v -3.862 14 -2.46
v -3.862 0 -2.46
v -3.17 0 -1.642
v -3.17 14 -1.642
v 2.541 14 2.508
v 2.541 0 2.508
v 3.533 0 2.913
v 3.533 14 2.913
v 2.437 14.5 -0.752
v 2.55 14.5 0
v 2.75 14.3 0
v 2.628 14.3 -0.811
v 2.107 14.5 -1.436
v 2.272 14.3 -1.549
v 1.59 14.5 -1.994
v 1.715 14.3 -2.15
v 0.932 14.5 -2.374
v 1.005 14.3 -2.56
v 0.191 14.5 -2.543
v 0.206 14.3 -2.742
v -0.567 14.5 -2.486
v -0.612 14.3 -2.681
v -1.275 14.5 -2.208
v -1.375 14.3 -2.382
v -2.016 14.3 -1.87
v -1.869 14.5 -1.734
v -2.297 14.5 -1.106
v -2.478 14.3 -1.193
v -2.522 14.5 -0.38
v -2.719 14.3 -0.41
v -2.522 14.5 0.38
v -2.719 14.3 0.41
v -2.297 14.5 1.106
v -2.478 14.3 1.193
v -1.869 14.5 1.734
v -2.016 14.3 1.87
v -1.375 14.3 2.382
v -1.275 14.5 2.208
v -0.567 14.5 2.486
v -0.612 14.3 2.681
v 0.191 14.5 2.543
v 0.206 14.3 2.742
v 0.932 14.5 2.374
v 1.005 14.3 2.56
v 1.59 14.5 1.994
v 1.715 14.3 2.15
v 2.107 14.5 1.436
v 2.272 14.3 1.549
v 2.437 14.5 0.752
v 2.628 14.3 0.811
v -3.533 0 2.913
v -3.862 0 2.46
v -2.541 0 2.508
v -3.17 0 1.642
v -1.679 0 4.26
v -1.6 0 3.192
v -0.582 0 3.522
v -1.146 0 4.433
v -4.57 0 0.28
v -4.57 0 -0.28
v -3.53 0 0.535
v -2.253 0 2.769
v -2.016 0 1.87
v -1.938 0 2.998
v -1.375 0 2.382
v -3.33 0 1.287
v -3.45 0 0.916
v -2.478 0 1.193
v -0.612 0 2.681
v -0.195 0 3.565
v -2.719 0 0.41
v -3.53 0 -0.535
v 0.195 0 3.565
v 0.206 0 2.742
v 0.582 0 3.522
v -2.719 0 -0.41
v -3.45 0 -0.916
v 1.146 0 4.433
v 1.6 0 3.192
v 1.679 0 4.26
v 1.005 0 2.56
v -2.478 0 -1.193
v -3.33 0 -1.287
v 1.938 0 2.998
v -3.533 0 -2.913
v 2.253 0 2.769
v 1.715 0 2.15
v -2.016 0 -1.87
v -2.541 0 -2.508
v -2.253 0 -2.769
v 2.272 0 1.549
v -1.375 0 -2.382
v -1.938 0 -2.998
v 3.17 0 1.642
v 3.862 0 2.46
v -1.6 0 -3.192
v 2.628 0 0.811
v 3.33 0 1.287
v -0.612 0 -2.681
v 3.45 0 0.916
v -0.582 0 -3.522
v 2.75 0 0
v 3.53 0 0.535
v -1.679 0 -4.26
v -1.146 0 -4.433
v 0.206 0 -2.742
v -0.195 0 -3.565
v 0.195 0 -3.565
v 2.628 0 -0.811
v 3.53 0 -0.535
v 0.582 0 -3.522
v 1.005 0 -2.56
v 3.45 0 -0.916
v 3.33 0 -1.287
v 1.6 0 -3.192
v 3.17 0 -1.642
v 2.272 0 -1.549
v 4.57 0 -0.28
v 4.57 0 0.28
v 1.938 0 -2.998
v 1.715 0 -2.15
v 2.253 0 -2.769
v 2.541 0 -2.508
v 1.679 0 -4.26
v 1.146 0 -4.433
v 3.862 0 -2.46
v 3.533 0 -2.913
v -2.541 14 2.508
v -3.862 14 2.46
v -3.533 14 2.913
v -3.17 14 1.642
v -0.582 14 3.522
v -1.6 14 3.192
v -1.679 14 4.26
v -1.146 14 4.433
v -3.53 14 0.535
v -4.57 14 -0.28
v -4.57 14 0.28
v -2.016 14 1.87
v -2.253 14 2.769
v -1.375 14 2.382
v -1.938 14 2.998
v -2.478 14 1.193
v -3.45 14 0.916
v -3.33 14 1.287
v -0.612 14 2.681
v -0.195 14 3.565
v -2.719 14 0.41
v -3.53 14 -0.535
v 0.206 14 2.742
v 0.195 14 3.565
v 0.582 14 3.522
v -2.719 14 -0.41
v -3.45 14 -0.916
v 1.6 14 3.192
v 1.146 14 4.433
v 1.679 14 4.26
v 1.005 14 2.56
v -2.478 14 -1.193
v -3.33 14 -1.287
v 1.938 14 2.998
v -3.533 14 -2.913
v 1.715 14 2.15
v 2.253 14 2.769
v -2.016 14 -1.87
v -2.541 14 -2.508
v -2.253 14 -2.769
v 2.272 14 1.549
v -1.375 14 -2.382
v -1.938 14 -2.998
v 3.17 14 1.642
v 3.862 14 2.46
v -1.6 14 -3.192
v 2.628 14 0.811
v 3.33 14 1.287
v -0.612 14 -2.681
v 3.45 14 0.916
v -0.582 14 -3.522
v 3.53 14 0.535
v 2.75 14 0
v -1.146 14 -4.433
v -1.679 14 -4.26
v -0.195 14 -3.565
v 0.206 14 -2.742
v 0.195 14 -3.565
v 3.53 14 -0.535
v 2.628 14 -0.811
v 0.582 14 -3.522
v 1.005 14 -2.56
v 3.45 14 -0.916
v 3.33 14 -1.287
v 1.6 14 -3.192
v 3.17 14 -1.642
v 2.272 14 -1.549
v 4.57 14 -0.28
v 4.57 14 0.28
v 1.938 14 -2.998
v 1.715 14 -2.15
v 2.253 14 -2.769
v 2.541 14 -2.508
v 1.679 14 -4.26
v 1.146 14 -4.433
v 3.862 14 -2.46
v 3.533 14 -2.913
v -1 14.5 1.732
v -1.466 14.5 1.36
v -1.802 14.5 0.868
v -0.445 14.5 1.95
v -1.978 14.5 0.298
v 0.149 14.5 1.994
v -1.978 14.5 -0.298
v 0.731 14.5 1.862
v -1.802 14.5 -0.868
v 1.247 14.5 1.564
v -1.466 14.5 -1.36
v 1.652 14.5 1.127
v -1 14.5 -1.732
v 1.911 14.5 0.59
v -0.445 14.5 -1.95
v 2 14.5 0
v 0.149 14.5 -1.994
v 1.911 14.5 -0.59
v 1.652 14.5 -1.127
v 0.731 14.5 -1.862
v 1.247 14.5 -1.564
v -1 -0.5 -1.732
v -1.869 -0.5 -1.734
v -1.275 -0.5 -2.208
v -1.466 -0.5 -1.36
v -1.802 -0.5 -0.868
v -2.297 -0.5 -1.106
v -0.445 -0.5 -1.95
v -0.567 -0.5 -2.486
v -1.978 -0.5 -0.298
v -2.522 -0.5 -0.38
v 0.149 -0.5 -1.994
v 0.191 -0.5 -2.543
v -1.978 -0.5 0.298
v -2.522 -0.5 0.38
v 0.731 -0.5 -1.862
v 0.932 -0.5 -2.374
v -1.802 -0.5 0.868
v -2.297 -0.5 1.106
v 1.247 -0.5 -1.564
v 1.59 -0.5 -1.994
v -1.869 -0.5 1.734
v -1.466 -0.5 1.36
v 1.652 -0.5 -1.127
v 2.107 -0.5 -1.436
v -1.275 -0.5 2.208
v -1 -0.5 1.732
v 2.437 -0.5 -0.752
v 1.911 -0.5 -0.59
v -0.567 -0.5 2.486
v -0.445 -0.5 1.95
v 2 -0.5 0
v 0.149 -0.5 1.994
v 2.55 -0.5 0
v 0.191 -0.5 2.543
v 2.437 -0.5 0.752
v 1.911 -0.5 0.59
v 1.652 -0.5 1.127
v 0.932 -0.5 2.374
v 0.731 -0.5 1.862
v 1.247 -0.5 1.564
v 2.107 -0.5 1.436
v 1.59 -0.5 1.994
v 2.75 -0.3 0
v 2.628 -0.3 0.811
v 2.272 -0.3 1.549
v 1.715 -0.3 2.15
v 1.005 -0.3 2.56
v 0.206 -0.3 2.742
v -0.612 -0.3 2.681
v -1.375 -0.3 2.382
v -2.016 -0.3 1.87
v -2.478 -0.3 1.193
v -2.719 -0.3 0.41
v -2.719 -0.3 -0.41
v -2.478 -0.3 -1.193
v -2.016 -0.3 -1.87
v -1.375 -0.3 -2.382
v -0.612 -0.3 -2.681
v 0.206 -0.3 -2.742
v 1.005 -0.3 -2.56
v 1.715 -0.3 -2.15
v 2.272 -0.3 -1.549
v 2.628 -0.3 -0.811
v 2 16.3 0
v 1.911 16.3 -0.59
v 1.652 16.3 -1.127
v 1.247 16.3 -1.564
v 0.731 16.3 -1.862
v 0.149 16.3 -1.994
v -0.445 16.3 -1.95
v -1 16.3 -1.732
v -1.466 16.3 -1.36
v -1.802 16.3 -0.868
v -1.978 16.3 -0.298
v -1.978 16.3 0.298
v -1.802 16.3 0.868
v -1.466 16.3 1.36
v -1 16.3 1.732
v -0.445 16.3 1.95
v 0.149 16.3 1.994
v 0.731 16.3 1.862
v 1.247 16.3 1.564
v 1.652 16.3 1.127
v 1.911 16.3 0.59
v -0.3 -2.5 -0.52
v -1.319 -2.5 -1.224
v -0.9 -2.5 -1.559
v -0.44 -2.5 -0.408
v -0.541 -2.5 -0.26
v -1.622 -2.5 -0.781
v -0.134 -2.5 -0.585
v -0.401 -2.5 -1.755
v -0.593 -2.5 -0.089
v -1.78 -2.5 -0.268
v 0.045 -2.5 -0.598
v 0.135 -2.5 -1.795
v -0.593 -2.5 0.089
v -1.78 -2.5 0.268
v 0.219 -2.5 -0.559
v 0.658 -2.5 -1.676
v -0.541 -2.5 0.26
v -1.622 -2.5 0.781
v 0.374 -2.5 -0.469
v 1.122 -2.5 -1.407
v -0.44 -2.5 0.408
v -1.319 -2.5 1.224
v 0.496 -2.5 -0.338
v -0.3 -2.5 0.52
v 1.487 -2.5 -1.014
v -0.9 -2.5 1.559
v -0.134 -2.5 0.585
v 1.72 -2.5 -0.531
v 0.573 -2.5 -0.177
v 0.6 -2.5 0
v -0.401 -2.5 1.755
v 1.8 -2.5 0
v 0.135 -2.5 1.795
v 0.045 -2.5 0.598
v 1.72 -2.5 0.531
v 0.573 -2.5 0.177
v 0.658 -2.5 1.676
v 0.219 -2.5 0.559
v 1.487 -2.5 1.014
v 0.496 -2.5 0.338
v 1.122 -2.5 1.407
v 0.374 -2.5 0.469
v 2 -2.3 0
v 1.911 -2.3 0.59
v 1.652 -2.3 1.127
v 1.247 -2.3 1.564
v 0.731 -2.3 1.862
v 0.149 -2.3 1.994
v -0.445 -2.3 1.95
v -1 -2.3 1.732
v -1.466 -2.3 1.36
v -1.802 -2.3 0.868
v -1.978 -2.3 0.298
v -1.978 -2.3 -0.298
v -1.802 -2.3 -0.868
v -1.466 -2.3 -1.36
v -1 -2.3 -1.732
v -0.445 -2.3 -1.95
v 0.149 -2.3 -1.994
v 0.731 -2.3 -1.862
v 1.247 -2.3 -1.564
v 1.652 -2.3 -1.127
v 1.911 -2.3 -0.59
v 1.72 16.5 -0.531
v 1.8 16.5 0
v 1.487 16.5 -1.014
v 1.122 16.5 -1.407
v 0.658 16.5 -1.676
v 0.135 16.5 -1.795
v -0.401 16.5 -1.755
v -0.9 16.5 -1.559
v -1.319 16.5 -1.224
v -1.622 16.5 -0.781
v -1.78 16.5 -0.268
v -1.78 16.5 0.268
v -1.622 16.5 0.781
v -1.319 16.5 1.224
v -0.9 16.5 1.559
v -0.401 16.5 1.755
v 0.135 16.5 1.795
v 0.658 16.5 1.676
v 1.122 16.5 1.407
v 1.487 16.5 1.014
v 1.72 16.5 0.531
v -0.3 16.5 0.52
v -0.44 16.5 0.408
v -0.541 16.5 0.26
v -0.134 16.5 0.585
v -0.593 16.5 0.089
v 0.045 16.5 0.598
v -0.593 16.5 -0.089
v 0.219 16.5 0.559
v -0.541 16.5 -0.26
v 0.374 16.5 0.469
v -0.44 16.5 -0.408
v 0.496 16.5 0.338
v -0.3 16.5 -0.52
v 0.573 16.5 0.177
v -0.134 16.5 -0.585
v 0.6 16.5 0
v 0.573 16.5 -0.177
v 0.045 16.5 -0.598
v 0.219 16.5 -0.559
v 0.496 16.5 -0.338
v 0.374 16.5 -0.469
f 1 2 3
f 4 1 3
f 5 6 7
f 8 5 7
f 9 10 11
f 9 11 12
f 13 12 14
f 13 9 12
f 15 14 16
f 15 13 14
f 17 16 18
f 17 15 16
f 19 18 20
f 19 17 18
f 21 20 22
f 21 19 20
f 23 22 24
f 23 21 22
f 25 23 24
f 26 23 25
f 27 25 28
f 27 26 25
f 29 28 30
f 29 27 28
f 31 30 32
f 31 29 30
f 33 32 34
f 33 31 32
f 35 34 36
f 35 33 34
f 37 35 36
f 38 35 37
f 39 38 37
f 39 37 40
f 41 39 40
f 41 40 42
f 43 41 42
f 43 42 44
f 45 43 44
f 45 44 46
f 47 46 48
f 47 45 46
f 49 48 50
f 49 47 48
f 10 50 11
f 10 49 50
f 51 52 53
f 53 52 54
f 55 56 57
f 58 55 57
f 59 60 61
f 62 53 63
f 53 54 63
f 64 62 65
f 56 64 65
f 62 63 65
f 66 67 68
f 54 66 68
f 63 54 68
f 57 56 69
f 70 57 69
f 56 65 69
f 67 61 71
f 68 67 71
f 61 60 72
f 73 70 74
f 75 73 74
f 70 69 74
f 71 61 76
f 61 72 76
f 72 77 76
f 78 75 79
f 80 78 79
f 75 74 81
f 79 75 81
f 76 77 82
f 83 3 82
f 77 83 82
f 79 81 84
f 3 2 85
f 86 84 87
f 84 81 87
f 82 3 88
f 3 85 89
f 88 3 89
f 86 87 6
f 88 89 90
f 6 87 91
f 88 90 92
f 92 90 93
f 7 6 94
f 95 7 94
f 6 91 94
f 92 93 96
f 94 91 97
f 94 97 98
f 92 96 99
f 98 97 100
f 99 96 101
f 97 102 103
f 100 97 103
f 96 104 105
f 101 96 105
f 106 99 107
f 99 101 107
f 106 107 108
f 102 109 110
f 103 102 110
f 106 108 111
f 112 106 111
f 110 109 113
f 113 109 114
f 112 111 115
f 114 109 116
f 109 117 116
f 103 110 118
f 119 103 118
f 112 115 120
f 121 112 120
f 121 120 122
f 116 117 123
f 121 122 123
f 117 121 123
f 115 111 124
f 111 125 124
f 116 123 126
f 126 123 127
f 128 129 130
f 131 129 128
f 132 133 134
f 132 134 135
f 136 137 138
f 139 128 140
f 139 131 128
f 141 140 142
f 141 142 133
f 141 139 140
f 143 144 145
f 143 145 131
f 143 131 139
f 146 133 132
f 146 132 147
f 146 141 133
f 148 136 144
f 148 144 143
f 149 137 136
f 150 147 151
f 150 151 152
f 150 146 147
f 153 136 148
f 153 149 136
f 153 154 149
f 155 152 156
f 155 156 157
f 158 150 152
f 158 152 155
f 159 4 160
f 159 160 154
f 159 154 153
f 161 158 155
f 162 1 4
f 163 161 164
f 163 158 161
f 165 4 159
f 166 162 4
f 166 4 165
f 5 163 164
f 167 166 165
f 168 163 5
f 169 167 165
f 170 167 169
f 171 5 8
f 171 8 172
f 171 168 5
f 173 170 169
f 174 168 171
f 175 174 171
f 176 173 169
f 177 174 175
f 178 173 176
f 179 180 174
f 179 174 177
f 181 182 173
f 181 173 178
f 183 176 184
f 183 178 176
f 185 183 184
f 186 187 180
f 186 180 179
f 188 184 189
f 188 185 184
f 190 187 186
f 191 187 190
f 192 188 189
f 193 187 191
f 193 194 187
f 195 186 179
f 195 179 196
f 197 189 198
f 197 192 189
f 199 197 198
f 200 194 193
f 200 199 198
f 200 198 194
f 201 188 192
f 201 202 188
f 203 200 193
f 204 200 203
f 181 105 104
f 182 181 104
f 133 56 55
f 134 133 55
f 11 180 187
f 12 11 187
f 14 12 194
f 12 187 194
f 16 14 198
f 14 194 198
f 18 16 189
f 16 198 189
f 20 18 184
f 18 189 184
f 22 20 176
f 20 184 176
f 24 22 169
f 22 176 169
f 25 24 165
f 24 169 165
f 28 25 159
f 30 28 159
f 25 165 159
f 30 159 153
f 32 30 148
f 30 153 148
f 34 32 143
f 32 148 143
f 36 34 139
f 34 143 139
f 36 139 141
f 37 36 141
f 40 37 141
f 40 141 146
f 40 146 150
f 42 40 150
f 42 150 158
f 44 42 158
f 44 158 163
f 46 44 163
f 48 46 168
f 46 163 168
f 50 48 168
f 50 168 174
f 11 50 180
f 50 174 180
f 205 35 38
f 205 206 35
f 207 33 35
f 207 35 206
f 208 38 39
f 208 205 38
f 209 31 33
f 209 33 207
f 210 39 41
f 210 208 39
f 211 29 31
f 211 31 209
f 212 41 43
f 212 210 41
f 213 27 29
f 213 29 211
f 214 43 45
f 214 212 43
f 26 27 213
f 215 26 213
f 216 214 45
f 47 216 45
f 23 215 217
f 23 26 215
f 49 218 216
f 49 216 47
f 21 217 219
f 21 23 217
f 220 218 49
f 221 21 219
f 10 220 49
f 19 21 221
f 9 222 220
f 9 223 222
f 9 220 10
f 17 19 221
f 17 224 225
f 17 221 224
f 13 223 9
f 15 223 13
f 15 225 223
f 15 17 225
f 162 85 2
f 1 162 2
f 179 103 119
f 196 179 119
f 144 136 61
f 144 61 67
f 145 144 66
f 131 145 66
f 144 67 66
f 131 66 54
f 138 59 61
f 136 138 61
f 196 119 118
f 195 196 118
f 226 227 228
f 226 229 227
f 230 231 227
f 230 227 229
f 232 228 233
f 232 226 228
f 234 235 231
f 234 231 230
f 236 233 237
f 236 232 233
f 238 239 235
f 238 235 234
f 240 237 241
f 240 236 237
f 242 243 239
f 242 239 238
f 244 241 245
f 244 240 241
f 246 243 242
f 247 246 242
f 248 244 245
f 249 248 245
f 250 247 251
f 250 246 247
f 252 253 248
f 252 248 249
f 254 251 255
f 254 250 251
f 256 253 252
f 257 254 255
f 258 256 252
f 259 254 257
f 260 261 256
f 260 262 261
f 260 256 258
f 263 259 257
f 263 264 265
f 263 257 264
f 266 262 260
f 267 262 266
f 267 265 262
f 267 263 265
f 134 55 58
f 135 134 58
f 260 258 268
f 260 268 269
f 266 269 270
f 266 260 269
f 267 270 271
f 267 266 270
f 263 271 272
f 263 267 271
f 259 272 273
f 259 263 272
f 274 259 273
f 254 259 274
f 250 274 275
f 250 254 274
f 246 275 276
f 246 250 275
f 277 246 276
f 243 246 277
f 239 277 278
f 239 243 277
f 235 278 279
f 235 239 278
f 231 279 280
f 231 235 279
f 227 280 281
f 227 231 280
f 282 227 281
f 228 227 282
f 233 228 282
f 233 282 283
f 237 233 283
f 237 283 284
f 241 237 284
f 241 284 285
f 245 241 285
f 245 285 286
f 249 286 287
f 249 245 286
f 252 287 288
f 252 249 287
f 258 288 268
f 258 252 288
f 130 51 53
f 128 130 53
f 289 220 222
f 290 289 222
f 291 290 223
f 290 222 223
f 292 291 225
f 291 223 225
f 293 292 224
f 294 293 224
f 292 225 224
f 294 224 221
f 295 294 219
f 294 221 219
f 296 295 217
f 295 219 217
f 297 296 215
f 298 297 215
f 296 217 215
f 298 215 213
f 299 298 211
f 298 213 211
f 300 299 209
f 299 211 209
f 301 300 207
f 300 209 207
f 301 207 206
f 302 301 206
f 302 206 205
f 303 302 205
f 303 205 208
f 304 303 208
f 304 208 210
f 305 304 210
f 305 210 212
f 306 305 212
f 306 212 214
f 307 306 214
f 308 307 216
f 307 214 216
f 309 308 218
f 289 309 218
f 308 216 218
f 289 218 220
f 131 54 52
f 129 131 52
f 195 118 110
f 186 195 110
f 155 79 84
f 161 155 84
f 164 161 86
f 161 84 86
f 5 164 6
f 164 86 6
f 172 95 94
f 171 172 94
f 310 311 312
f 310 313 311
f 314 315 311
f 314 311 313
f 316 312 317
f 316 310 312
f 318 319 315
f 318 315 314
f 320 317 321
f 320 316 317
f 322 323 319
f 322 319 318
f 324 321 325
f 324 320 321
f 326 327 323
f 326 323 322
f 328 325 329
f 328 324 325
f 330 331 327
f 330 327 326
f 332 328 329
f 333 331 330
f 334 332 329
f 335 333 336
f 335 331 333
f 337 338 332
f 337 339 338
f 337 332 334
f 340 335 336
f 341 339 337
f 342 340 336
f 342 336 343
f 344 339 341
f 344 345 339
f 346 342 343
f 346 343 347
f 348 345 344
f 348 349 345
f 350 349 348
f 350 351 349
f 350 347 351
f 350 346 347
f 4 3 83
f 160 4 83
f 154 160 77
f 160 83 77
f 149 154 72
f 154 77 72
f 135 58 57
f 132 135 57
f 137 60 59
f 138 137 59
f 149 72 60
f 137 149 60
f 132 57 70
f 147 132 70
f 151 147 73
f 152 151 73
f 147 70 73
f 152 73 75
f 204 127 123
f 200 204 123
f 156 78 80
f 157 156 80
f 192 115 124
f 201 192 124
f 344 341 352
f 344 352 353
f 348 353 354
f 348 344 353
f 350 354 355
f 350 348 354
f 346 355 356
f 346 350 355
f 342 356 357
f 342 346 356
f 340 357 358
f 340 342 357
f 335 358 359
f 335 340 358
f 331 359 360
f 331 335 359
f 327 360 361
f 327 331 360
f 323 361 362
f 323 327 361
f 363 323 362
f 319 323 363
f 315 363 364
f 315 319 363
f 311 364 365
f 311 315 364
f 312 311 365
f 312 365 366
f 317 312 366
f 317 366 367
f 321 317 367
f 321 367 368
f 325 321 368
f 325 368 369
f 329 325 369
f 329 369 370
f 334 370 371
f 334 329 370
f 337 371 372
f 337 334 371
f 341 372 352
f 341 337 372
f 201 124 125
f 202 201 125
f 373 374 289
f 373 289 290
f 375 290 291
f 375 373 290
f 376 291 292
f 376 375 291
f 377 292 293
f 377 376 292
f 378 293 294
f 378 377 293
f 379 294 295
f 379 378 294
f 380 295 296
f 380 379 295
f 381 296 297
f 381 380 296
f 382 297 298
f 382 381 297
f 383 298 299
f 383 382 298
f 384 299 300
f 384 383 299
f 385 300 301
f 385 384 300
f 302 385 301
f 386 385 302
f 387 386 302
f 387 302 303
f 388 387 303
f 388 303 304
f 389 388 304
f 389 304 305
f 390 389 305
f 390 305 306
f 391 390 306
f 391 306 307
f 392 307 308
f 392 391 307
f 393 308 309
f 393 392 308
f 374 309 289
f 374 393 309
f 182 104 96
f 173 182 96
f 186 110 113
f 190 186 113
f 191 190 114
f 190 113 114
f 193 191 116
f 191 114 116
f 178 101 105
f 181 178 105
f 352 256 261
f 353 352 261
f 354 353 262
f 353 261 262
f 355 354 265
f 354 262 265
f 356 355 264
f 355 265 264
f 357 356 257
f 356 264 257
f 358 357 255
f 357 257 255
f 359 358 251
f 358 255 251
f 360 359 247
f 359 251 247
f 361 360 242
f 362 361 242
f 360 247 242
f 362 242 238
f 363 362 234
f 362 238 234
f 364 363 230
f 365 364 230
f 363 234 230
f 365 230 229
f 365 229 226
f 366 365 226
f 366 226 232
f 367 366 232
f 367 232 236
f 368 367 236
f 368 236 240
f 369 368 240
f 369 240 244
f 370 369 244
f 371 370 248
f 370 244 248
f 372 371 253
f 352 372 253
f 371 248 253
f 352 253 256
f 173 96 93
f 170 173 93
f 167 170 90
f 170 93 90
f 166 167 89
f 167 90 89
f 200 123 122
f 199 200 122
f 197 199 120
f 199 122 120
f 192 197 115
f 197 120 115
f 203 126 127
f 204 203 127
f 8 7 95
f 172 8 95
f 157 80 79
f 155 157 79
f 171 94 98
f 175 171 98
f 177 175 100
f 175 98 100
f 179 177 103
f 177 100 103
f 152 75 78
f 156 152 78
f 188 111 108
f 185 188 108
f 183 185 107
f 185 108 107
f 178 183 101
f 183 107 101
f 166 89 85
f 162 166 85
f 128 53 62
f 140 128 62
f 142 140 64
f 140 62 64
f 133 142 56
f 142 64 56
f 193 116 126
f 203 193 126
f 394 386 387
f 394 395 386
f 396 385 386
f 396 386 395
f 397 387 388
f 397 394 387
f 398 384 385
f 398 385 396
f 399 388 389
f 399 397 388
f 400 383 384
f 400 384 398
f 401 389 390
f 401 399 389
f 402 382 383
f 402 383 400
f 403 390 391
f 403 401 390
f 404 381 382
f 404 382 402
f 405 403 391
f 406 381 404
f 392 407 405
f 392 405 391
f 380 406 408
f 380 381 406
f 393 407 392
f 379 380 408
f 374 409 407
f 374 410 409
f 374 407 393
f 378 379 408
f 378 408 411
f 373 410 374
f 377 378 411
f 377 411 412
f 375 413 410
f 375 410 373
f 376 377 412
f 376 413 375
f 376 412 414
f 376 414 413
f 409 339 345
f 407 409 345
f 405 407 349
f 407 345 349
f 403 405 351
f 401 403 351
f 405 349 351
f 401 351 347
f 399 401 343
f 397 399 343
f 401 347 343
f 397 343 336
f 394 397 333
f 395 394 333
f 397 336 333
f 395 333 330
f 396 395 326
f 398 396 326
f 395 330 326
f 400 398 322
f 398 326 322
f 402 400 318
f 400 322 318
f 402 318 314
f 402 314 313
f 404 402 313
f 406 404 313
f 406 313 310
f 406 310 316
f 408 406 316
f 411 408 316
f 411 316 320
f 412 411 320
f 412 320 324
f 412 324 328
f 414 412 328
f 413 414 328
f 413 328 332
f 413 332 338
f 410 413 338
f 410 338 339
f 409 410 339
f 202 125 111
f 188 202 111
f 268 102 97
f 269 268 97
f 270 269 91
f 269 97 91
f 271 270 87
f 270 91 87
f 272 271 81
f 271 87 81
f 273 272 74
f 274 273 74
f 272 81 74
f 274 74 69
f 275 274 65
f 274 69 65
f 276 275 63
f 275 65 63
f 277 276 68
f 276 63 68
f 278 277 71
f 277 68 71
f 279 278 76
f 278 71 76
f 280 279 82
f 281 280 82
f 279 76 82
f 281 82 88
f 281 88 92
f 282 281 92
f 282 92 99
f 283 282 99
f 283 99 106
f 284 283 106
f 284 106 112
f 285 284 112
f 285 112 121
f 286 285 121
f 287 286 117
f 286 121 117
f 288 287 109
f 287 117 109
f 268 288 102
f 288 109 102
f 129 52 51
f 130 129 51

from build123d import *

# Parameters (mm, degrees)
BOSS_EXTRUDE3_DEPTH = 14
CIRPATTERN2_COUNT   = 10
SKETCH3_R           = 2.75
BOSS_EXTRUDE4_DEPTH = 0.5
SKETCH4_R           = 2.75
BOSS_EXTRUDE5_DEPTH = 0.5
SKETCH5_R           = 2
BOSS_EXTRUDE6_DEPTH = 2
SKETCH6_R           = 2
BOSS_EXTRUDE7_DEPTH = 2
CHAMFER1_SIZE       = 0.2
SKETCH7_R           = 0.6
CUT_EXTRUDE1_DEPTH  = 20


with BuildPart() as part:
    # Sketch1 → Boss-Extrude3 (new body)
    with BuildSketch(Plane(origin=(0, 0, 0), x_dir=(1, 0, 0), z_dir=(0, 1, 0))):
        with BuildLine():
            ThreePointArc((3.529675716, 0.535060126), (-3.57, 0), (3.529675716, -0.535060126))
            Line((3.529675716, -0.535060126), (3.265358075, -0.599863853))
            ThreePointArc((3.265358075, -0.599863853), (3.32, 0), (3.265358075, 0.599863853))
            Line((3.265358075, 0.599863853), (3.529675716, 0.535060126))
        make_face()
        with BuildLine():
            Line((3.265358075, -0.599863853), (3.529675716, -0.535060126))
            ThreePointArc((3.529675716, -0.535060126), (3.559904655, -0.268288737), (3.57, 0))
            ThreePointArc((3.57, 0), (3.559904655, 0.268288737), (3.529675716, 0.535060126))
            Line((3.529675716, 0.535060126), (3.265358075, 0.599863853))
            ThreePointArc((3.265358075, 0.599863853), (3.32, 0), (3.265358075, -0.599863853))
        make_face()
        with BuildLine():
            Line((4.57, -0.28), (4.57, 0))
            Line((4.57, 0), (4.57, 0.28))
            Line((4.57, 0.28), (3.529675716, 0.535060126))
            ThreePointArc((3.529675716, 0.535060126), (3.559904655, 0.268288737), (3.57, 0))
            ThreePointArc((3.57, 0), (3.559904655, -0.268288737), (3.529675716, -0.535060126))
            Line((3.529675716, -0.535060126), (4.57, -0.28))
        make_face()
    boss_extrude3 = extrude(amount=BOSS_EXTRUDE3_DEPTH)

    # CirPattern2: Boss-Extrude3 ×10 about axis
    cirpattern2_axis = Axis((0, 0, 0), (0, 1, 0))
    for i in range(1, CIRPATTERN2_COUNT):
        add(boss_extrude3.rotate(cirpattern2_axis, i * 360 / CIRPATTERN2_COUNT))

    # Sketch3 → Boss-Extrude4 (add)
    with BuildSketch(Plane(origin=(0, 14, 0), x_dir=(1, 0, 0), z_dir=(0, 1, 0))):
        Circle(SKETCH3_R)
    extrude(amount=BOSS_EXTRUDE4_DEPTH)

    # Sketch4 → Boss-Extrude5 (add)
    with BuildSketch(Plane.XZ):
        Circle(SKETCH4_R)
    extrude(amount=BOSS_EXTRUDE5_DEPTH)

    # Sketch5 → Boss-Extrude6 (add)
    with BuildSketch(Plane(origin=(0, 14.5, 0), x_dir=(1, 0, 0), z_dir=(0, 1, 0))):
        Circle(SKETCH5_R)
    extrude(amount=BOSS_EXTRUDE6_DEPTH)

    # Sketch6 → Boss-Extrude7 (add)
    with BuildSketch(Plane.XZ.offset(0.5)):
        Circle(SKETCH6_R)
    extrude(amount=BOSS_EXTRUDE7_DEPTH)

    # Chamfer1
    chamfer1_edges = [part.edges().sort_by_distance(p)[0] for p in [
        (-2.75, 14.5, 0),
        (-2.75, -0.5, 0),
        (-2, 16.5, 0),
        (-2, -2.5, 0),
    ]]
    chamfer(chamfer1_edges, length=CHAMFER1_SIZE)

    # Sketch7 → Cut-Extrude1 (cut, through all)
    with BuildSketch(Plane.XZ.offset(2.5)):
        Circle(SKETCH7_R)
    extrude(amount=-CUT_EXTRUDE1_DEPTH, mode=Mode.SUBTRACT)


solid = part.part
